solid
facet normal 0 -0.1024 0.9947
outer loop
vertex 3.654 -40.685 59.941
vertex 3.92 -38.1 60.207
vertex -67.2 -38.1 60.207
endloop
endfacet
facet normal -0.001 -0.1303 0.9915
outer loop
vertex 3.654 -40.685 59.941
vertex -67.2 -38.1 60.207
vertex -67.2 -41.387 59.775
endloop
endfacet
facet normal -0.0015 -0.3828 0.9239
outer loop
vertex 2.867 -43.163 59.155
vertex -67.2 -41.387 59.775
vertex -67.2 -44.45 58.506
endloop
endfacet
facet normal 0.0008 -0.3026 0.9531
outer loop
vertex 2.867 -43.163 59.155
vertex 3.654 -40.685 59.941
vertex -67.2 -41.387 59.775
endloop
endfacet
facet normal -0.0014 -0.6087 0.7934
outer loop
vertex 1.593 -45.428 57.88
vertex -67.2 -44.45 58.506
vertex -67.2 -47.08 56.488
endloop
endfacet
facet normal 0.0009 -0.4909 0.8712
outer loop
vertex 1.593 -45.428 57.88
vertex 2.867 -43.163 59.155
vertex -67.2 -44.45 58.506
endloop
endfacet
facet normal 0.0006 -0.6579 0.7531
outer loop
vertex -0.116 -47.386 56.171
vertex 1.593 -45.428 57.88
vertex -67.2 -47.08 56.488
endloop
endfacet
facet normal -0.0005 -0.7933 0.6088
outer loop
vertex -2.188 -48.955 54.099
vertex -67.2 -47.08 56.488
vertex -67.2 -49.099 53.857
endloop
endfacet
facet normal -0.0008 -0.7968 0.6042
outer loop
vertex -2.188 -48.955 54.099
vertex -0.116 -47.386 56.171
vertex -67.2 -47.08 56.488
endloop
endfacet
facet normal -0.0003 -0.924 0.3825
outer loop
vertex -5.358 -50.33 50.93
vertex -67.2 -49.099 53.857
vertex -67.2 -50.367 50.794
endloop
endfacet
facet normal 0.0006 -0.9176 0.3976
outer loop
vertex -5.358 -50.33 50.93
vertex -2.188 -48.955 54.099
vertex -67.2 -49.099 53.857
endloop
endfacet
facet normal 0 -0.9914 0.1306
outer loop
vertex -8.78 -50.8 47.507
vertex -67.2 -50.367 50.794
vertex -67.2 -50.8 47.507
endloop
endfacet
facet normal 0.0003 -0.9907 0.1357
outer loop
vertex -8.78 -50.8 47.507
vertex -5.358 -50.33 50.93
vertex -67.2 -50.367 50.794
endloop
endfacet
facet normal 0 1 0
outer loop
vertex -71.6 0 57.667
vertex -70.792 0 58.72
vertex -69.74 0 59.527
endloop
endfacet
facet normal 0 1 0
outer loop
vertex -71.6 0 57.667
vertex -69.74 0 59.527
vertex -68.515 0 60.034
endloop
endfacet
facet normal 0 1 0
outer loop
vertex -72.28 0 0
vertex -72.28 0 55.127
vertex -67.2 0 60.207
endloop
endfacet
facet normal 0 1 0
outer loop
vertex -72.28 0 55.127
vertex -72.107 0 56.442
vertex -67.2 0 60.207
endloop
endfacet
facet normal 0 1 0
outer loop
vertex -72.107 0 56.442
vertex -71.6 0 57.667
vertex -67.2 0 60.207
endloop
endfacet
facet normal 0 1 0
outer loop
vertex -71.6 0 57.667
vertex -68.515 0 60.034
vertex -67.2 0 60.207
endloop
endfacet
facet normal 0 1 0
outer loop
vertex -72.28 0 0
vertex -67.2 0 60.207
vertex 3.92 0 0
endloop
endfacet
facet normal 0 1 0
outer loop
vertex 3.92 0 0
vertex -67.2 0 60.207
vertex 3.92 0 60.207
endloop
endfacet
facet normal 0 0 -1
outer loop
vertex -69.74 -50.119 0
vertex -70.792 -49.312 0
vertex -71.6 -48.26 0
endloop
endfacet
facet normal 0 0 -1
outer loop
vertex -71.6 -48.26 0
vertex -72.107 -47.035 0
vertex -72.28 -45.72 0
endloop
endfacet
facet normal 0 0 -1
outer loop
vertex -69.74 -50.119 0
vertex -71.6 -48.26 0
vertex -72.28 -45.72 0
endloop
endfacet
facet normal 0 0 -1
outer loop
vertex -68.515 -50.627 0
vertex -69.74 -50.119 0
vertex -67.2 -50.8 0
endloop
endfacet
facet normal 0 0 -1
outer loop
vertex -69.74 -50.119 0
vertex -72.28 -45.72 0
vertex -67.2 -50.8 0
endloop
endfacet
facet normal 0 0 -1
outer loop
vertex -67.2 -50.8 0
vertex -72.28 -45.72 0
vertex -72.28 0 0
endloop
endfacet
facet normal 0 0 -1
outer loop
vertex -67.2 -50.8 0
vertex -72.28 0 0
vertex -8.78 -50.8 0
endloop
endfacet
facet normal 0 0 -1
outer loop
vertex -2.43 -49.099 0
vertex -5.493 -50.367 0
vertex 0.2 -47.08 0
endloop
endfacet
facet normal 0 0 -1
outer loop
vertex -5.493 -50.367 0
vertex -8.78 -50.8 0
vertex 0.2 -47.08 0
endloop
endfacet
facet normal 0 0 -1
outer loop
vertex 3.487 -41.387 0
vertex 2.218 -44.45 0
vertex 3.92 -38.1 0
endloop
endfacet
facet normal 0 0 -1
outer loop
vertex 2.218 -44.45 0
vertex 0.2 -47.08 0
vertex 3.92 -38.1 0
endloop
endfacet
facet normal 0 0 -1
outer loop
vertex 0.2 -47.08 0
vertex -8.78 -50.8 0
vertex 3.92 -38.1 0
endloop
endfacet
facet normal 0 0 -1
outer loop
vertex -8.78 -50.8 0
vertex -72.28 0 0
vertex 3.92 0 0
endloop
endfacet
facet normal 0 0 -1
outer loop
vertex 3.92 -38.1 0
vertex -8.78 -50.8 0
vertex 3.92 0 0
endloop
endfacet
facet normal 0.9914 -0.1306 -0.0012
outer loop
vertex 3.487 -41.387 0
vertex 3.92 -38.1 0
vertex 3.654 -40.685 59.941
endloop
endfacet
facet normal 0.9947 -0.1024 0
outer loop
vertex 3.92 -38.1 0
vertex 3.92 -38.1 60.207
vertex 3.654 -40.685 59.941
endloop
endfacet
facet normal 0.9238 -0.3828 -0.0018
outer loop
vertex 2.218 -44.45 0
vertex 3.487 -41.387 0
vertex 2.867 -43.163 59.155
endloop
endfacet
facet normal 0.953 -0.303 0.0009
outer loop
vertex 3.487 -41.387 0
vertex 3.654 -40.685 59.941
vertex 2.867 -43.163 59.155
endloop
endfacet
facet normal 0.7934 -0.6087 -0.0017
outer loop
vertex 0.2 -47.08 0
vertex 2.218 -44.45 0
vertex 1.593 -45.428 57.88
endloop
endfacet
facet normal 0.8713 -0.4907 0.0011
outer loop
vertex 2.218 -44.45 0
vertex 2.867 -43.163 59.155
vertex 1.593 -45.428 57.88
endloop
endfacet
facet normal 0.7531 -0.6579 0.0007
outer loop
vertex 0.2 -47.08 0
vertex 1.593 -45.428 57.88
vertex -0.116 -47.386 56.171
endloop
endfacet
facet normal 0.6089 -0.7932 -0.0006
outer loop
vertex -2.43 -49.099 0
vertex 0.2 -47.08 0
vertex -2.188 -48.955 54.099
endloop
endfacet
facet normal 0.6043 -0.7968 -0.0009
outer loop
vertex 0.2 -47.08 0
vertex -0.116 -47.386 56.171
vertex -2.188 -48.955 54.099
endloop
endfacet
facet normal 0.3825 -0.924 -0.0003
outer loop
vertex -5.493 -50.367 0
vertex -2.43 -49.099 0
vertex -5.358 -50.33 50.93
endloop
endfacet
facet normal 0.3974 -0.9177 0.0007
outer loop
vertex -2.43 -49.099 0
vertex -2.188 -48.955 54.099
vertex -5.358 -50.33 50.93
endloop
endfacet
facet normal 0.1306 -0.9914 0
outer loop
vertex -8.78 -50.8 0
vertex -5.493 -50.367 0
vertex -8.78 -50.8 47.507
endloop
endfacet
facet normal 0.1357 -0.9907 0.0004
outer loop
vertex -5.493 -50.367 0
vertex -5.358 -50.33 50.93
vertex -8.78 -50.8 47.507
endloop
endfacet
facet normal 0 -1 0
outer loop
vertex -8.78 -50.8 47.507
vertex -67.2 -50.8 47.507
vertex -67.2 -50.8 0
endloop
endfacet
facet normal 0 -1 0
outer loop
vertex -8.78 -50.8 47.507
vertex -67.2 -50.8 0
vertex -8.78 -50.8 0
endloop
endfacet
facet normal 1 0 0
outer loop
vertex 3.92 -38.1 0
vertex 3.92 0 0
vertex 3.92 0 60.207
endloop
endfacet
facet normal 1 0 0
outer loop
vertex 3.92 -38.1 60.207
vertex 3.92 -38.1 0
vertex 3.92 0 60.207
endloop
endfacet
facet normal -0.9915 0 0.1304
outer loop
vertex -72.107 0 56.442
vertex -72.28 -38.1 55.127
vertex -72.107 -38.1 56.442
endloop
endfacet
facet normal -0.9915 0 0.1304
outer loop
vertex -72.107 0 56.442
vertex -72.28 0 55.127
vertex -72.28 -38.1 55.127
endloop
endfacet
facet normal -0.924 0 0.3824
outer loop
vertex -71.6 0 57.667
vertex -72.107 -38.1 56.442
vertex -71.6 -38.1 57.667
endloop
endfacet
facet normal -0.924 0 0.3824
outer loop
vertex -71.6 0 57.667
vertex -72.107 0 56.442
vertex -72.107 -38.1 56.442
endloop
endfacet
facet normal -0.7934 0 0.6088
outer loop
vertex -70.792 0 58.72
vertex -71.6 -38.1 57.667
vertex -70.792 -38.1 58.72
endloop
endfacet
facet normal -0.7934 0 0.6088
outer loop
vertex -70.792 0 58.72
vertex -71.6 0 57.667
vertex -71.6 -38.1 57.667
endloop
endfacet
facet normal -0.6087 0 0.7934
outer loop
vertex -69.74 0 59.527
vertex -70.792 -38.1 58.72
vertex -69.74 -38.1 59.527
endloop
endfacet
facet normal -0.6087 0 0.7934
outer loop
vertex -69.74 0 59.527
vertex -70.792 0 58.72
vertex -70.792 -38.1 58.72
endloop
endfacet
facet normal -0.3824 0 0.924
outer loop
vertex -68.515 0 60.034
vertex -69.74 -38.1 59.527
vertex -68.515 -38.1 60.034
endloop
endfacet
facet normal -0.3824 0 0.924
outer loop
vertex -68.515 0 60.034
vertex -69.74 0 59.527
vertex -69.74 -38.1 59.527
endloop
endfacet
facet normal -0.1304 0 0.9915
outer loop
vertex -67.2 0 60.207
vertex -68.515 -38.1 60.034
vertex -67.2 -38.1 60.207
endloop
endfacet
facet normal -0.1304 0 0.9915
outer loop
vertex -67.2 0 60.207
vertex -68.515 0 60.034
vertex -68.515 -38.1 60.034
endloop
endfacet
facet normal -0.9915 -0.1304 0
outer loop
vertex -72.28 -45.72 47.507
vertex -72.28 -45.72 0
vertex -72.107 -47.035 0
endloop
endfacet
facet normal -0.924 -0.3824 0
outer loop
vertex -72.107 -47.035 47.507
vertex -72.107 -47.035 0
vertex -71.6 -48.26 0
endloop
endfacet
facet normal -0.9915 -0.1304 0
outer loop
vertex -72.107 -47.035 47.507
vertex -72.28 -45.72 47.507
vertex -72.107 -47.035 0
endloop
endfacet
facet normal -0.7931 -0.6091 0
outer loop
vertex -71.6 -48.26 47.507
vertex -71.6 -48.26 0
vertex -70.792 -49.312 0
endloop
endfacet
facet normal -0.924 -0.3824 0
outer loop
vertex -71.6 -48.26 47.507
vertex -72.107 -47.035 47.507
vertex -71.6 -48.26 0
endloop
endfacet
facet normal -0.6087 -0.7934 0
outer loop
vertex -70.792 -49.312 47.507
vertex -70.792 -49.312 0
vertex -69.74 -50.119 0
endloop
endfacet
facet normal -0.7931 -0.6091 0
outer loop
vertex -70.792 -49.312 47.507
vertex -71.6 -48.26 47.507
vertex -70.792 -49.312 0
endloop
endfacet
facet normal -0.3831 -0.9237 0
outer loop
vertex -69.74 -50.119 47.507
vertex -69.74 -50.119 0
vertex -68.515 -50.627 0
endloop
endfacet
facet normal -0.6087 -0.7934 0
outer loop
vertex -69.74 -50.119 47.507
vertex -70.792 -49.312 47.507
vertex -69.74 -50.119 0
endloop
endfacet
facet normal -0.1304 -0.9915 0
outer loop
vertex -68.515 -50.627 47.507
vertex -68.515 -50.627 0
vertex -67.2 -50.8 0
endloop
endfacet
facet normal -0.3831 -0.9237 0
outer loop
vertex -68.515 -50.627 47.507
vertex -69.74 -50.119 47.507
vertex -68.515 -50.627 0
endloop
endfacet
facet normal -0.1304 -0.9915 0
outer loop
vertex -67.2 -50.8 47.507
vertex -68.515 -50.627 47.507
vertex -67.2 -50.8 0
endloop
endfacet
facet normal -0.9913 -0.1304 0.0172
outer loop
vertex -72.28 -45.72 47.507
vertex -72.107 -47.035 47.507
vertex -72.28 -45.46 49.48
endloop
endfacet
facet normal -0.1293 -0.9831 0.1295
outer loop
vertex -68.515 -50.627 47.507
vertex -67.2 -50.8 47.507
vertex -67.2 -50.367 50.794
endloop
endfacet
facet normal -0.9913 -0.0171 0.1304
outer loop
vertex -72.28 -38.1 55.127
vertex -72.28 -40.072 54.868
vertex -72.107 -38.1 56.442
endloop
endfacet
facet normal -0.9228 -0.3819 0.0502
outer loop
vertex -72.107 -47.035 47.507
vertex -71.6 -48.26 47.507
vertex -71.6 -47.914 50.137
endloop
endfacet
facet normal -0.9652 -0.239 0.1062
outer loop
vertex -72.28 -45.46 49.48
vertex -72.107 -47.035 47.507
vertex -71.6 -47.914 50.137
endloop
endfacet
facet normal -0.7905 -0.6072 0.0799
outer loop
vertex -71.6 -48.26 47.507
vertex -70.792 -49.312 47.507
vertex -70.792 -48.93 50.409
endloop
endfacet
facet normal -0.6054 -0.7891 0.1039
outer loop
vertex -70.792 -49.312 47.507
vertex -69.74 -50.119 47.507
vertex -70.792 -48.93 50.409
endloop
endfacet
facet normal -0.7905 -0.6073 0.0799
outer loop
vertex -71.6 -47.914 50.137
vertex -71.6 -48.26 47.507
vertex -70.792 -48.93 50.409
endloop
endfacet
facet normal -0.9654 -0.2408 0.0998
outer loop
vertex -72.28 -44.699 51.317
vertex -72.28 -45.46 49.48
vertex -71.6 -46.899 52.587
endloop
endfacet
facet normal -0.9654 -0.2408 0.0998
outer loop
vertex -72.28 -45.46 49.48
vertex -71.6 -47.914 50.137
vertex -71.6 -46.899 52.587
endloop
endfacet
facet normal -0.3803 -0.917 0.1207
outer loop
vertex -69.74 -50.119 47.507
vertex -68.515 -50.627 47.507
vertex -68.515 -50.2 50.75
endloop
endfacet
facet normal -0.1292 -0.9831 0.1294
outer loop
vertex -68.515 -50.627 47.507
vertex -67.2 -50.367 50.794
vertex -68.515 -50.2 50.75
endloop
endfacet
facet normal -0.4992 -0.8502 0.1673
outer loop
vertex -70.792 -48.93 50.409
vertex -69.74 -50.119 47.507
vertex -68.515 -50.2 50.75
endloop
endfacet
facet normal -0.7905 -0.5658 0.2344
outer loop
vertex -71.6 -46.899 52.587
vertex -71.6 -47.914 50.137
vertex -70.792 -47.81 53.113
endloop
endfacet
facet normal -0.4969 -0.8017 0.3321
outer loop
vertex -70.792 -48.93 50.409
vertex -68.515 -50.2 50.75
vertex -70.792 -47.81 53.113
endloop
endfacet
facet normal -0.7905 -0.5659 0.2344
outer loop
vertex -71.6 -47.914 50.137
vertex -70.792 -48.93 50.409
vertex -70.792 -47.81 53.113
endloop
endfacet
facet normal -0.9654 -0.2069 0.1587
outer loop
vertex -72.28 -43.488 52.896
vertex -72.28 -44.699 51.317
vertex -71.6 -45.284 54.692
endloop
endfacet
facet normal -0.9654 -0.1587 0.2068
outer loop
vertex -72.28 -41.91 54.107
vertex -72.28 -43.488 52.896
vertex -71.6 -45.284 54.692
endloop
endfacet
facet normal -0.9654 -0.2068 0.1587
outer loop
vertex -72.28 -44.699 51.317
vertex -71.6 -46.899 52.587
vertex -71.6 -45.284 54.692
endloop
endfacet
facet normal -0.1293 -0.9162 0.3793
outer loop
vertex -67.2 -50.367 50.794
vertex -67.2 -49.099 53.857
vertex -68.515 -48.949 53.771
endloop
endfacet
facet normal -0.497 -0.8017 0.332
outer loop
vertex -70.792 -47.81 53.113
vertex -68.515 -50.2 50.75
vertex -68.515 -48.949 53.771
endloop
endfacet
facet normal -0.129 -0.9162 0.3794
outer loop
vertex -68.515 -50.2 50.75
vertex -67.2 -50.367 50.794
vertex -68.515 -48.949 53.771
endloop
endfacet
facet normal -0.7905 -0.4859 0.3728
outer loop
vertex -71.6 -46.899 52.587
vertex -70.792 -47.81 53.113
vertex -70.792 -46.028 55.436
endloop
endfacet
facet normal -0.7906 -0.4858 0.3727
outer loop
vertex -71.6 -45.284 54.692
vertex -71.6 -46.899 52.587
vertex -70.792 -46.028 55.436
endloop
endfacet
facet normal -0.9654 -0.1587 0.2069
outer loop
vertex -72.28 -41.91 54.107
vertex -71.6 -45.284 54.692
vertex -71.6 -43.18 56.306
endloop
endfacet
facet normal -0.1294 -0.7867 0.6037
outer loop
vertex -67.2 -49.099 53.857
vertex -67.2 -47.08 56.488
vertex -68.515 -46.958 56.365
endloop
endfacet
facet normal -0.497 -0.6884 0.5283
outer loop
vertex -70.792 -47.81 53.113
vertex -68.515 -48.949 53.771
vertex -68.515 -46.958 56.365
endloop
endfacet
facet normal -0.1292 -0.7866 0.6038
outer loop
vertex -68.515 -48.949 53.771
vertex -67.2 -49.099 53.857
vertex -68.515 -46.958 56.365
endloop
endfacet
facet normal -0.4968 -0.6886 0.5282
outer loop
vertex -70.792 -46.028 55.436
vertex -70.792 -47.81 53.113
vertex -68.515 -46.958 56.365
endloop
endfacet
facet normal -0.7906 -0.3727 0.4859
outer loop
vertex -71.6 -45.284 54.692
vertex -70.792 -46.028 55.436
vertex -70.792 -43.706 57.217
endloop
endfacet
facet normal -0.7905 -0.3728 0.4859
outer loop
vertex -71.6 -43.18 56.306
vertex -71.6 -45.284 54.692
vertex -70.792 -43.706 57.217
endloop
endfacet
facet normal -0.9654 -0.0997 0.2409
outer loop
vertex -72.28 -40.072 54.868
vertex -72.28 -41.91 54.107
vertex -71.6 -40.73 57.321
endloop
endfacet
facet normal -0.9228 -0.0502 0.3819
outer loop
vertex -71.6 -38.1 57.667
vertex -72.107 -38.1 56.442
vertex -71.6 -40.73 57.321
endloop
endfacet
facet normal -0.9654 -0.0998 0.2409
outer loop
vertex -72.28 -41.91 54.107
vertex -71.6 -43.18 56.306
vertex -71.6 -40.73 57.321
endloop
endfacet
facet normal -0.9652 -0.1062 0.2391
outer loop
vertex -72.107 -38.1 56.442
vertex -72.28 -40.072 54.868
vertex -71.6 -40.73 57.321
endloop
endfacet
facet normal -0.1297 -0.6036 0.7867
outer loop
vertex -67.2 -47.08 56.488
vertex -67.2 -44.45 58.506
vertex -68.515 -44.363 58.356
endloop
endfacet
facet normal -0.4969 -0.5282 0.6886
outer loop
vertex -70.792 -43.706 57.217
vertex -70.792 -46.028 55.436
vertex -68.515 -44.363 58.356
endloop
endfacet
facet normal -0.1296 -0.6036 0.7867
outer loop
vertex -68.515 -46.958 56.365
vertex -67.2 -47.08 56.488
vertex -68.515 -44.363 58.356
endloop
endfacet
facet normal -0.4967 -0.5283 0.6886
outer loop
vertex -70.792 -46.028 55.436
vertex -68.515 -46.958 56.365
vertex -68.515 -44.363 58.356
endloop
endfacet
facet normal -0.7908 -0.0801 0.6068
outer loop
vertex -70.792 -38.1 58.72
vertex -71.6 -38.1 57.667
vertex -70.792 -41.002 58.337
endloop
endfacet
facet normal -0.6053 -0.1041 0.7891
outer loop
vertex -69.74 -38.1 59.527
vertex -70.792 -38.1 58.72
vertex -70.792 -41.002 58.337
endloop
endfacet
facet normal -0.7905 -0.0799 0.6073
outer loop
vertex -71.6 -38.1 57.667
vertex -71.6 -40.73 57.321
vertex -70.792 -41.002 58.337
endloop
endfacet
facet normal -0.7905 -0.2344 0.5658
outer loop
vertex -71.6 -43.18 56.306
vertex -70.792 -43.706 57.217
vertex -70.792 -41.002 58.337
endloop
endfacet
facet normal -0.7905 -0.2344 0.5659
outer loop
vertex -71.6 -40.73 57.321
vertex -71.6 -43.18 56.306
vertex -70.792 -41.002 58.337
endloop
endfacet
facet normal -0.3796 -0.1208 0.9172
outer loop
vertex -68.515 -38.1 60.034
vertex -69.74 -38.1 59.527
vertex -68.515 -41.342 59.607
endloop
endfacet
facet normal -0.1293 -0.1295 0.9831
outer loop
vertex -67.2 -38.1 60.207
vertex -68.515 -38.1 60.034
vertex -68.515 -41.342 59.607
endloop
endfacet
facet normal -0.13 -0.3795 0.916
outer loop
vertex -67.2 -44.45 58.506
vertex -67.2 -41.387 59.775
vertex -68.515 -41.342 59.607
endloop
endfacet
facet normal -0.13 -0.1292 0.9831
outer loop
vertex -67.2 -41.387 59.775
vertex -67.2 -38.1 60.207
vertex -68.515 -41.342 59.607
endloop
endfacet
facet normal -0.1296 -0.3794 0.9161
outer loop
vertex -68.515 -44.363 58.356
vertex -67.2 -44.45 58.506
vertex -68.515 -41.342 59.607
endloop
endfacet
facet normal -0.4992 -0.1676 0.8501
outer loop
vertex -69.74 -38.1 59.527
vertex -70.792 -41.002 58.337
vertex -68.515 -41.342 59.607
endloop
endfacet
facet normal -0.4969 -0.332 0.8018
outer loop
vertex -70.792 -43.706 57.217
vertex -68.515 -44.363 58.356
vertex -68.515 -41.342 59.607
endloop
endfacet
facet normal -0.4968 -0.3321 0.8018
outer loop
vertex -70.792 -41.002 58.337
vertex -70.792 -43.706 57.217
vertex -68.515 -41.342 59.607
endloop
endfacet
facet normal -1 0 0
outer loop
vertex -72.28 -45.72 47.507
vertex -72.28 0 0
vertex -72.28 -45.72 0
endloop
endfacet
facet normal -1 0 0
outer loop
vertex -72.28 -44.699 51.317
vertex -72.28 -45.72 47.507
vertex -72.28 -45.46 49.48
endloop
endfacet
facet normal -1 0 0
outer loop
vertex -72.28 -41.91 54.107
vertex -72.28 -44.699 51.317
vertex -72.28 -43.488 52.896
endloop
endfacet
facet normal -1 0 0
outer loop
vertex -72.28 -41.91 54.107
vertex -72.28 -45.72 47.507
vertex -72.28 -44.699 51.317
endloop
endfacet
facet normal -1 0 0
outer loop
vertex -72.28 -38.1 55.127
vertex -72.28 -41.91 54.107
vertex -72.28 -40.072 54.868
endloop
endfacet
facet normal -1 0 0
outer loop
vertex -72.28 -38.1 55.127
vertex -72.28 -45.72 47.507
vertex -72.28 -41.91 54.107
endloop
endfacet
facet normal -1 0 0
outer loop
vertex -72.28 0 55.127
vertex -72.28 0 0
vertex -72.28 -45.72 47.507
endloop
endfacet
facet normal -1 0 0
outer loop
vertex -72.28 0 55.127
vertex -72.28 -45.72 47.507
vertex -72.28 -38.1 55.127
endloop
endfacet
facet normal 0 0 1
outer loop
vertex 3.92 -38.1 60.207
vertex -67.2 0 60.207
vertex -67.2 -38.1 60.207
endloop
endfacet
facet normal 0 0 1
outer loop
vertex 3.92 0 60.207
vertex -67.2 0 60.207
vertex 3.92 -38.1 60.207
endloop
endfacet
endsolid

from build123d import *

# Parameters (mm, degrees)
F0_W     = 76.2
F0_H     = 60.207408
F1_DEPTH = 50.8
F2_R     = 12.7
F3_R     = 5.08


with BuildPart() as f1:
    # F0 (on Front) → F1 (new body)
    with BuildSketch(Plane.XZ):
        with Locations((-34.180247, 30.103704)):
            Rectangle(F0_W, F0_H)
    extrude(amount=F1_DEPTH)

    # F2
    f2_edges = [f1.edges().sort_by_distance(p)[0] for p in [
        (-34.180247, -50.8, 60.207408),
        (3.919753, -50.8, 30.103704),
    ]]
    fillet(f2_edges, radius=F2_R)

    # F3
    f3_edges = [f1.edges().sort_by_distance(p)[0] for p in [
        (-72.280247, -50.8, 23.753704),
    ]]
    fillet(f3_edges, radius=F3_R)


solid = f1.part
